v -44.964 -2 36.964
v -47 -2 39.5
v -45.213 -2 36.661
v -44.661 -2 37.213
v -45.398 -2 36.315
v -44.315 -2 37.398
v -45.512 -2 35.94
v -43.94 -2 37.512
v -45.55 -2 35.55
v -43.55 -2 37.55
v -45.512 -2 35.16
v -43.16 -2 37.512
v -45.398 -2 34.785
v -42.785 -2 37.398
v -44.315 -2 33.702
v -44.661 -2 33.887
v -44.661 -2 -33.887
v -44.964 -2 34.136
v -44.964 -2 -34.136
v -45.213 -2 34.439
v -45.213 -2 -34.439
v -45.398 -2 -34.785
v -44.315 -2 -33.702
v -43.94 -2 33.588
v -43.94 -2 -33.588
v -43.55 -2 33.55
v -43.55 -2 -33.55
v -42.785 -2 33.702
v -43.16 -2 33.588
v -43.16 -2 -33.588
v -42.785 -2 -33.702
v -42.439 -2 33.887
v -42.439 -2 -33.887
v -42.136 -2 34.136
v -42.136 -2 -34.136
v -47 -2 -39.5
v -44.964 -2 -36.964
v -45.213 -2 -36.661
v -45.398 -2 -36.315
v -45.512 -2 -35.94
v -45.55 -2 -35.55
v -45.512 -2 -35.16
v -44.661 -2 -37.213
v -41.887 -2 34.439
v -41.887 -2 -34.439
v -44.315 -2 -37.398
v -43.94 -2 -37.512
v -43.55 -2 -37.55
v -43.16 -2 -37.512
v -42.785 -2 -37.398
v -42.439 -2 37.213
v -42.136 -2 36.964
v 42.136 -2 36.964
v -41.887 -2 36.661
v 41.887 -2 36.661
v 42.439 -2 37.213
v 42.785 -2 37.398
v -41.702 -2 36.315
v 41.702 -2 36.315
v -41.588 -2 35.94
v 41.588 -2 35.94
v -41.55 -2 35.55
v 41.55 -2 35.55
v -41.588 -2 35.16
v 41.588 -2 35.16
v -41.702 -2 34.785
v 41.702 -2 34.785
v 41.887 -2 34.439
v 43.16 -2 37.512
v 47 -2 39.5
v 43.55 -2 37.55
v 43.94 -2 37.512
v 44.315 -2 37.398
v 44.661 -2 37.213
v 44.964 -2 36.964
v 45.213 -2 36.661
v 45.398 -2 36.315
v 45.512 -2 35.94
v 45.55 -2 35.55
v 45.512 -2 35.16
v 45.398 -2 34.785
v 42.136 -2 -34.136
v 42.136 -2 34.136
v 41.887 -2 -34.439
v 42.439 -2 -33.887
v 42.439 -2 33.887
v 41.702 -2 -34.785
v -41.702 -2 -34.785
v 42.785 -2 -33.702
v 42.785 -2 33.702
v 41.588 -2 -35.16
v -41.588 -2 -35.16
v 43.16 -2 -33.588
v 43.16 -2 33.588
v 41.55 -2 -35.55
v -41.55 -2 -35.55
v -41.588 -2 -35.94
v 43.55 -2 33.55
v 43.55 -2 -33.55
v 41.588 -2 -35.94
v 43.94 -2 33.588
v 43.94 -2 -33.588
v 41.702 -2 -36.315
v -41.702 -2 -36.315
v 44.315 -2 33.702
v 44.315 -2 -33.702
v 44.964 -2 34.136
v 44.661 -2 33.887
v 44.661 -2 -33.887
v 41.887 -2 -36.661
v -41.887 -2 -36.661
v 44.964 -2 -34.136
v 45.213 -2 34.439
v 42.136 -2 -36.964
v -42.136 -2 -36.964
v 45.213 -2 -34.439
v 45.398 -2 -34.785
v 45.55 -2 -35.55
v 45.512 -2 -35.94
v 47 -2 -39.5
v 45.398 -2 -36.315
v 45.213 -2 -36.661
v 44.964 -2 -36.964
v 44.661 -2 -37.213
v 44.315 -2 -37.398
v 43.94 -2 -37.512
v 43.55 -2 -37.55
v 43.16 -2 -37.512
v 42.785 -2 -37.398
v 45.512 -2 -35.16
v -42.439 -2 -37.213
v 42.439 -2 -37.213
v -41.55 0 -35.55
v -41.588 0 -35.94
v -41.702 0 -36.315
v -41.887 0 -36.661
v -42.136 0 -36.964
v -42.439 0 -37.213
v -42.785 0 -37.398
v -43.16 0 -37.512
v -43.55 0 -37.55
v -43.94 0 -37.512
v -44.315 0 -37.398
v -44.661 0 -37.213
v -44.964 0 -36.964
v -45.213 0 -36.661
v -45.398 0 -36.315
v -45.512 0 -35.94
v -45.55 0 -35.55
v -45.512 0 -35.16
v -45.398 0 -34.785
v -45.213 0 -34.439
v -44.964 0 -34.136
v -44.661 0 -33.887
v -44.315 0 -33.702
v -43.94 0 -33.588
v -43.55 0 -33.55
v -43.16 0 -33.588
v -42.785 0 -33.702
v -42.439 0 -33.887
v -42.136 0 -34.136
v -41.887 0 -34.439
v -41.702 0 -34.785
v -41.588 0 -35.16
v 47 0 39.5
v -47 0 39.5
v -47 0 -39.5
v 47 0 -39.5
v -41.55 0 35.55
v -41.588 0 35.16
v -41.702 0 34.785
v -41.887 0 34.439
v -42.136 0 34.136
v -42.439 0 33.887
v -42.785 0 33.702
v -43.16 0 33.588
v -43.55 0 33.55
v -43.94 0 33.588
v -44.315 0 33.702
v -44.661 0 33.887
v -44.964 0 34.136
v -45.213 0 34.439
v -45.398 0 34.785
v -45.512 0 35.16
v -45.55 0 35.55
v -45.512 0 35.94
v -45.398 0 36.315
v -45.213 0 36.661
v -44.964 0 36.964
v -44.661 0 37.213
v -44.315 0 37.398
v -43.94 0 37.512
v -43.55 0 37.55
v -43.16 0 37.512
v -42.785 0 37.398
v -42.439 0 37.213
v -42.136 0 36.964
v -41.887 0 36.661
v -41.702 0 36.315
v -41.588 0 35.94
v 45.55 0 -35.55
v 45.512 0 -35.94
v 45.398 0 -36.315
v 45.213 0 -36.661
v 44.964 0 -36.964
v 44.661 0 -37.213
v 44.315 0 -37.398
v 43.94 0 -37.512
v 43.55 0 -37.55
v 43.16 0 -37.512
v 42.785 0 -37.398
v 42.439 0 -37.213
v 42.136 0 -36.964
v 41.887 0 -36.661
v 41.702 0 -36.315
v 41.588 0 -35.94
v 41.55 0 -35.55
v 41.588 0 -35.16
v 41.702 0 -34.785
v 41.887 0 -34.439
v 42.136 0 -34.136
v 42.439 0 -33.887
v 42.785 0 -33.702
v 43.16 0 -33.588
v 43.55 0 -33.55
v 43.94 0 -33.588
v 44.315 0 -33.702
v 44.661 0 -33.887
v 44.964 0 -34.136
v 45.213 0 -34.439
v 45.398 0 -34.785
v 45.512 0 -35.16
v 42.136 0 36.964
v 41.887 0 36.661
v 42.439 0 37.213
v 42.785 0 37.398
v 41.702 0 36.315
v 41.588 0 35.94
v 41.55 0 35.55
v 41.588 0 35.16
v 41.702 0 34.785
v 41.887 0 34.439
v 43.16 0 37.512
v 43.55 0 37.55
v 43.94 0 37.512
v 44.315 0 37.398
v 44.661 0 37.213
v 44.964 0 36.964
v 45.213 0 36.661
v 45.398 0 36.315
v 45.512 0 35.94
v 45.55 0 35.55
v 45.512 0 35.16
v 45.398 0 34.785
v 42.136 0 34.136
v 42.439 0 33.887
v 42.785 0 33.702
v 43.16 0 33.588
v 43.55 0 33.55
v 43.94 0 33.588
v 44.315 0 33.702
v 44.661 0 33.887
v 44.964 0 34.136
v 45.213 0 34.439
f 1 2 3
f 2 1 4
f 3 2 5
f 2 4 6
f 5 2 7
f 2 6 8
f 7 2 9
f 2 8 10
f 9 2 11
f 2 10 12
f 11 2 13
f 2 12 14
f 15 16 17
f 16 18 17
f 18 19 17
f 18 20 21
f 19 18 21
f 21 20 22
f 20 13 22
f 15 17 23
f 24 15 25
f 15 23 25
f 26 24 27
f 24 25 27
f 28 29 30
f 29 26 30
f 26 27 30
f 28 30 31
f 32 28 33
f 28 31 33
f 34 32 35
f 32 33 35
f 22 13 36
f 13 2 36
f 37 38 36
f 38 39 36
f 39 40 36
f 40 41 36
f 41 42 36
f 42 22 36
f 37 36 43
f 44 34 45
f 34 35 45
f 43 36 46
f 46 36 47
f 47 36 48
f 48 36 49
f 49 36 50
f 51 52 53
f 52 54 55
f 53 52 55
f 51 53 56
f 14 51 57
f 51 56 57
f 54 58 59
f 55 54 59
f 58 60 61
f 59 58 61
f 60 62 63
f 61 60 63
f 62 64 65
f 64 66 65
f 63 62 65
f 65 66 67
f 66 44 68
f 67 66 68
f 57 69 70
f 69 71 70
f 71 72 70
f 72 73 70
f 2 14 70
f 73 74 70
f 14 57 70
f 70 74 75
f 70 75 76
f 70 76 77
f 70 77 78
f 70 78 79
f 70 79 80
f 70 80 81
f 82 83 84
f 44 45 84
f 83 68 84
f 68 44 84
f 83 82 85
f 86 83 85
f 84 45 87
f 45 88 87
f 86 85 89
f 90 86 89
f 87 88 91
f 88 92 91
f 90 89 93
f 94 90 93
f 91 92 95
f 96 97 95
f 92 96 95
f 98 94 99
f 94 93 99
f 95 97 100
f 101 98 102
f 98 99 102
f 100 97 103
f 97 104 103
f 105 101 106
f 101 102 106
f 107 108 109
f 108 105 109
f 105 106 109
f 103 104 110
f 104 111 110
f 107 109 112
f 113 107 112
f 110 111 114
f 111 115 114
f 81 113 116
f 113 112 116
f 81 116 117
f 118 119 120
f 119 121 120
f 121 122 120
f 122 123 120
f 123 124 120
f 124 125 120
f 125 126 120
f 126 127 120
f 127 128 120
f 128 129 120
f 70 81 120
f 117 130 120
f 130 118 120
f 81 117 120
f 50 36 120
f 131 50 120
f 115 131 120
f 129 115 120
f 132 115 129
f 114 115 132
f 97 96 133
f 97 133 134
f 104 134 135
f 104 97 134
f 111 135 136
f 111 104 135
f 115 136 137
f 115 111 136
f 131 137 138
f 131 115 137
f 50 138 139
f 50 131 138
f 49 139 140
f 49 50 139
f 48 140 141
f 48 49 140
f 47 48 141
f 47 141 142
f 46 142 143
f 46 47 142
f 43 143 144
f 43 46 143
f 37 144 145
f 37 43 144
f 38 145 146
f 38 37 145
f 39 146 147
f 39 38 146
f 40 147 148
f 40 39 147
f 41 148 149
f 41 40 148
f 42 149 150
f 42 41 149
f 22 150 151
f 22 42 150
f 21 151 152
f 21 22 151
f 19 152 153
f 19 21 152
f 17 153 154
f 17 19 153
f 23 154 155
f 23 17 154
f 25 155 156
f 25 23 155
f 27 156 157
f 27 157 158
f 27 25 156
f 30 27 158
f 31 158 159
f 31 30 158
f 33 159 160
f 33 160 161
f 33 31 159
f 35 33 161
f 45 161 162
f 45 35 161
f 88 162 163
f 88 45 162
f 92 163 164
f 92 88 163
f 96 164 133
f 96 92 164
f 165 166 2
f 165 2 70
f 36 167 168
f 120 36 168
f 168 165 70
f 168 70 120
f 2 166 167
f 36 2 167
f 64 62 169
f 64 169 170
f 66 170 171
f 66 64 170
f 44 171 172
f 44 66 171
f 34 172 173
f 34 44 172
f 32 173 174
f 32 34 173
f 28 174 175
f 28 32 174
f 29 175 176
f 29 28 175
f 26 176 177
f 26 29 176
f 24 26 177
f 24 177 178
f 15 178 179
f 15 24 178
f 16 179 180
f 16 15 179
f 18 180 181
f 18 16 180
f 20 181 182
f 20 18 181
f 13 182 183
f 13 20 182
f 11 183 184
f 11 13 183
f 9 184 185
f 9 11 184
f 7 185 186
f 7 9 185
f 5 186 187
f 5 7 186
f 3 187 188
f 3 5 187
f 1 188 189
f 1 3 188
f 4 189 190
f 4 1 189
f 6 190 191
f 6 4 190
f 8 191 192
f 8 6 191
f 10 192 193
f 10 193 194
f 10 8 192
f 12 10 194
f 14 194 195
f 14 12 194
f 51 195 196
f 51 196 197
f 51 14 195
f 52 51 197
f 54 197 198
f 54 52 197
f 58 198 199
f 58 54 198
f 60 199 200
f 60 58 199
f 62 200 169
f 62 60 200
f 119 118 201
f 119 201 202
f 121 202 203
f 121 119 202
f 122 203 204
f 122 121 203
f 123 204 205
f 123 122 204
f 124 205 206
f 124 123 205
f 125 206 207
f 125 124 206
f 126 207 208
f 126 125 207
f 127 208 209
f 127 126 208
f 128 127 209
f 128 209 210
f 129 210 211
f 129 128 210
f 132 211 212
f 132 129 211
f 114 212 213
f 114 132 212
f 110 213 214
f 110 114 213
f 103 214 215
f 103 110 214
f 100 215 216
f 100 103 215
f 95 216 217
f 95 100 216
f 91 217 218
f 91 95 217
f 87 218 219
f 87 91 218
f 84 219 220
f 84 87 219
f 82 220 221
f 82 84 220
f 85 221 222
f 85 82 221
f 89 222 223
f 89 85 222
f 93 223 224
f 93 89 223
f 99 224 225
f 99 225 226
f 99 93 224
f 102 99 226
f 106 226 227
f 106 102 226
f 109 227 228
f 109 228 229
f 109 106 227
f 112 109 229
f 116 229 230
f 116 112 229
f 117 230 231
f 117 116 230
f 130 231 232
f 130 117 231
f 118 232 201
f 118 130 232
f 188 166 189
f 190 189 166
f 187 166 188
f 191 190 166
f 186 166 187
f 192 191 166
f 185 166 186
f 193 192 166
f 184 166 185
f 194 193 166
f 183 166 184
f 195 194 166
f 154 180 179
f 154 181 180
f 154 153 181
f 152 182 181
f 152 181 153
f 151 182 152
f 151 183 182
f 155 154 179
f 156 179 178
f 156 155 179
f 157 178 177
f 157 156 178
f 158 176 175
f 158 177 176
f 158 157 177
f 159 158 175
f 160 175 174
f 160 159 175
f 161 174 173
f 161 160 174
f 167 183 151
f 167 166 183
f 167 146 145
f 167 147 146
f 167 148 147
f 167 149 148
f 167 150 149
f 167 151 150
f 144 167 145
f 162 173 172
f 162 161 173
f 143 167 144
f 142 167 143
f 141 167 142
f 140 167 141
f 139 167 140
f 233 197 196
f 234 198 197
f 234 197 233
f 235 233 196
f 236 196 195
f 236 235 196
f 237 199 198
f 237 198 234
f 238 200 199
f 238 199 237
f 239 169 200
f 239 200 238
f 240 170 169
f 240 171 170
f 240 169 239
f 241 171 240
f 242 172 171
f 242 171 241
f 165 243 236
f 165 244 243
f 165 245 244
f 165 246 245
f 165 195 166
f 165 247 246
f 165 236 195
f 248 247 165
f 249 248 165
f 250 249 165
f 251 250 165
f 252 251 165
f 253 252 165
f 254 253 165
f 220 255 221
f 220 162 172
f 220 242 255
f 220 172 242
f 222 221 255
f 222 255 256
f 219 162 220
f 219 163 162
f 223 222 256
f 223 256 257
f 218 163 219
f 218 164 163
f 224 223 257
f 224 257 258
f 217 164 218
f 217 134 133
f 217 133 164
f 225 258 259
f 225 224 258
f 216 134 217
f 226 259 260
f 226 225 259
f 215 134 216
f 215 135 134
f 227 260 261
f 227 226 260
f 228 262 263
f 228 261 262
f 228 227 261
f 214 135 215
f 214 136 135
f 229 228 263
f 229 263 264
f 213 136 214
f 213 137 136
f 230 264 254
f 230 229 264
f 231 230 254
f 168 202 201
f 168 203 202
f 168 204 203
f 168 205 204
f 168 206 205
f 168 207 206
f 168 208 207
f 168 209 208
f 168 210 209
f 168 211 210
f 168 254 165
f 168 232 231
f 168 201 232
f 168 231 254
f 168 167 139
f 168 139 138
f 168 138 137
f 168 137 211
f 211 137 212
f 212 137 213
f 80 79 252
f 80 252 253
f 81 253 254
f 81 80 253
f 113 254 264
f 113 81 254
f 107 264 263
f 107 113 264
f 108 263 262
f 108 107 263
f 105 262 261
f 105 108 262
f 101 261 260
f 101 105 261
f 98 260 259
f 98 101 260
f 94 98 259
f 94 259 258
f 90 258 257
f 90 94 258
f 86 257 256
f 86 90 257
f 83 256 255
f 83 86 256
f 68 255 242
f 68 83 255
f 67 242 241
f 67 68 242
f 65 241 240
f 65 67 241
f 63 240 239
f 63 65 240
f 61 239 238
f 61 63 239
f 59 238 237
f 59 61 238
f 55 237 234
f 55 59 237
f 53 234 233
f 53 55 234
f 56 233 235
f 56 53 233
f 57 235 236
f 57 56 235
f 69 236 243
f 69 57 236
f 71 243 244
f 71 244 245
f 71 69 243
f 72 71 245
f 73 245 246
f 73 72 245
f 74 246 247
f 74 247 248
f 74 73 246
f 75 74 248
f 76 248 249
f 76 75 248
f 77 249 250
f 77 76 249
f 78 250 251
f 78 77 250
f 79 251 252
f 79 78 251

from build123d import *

# Parameters (mm, degrees)
SKETCH1_W                     = 94
SKETCH1_H                     = 79
BASE_FLANGE1_DEPTH            = 2
F_4_0MM_START                 = -2
F_4_0MM_DOWEL_HOLE1_OUTLINE_R = 2
F_4_0MM_DOWEL_HOLE1_DEPTH     = 2


# Read off the part's stored shape, not the designer's step: Ø4.0mm Dowel Hole1
# Sheet-metal steps are written as plain solids
with BuildPart() as part:
    # Sketch1 → Base-Flange1 (new body)
    with BuildSketch(Plane(origin=(0, 0, 0), x_dir=(1, 0, 0), z_dir=(0, 1, 0))):
        Rectangle(SKETCH1_W, SKETCH1_H)
    extrude(amount=-BASE_FLANGE1_DEPTH)

    # Ø4.0mm Dowel Hole1 outline → Ø4.0mm Dowel Hole1 (cut)
    with BuildSketch(Plane(origin=(0, 0, 0), x_dir=(1, 0, 0), z_dir=(0, 1, 0)).offset(F_4_0MM_START)):
        with Locations((43.55, 35.55)):
            Circle(F_4_0MM_DOWEL_HOLE1_OUTLINE_R)
        with Locations((-43.55, -35.55)):
            Circle(F_4_0MM_DOWEL_HOLE1_OUTLINE_R)
        with Locations((-43.55, 35.55)):
            Circle(F_4_0MM_DOWEL_HOLE1_OUTLINE_R)
        with Locations((43.55, -35.55)):
            Circle(F_4_0MM_DOWEL_HOLE1_OUTLINE_R)
    extrude(amount=F_4_0MM_DOWEL_HOLE1_DEPTH, mode=Mode.SUBTRACT)


solid = part.part
